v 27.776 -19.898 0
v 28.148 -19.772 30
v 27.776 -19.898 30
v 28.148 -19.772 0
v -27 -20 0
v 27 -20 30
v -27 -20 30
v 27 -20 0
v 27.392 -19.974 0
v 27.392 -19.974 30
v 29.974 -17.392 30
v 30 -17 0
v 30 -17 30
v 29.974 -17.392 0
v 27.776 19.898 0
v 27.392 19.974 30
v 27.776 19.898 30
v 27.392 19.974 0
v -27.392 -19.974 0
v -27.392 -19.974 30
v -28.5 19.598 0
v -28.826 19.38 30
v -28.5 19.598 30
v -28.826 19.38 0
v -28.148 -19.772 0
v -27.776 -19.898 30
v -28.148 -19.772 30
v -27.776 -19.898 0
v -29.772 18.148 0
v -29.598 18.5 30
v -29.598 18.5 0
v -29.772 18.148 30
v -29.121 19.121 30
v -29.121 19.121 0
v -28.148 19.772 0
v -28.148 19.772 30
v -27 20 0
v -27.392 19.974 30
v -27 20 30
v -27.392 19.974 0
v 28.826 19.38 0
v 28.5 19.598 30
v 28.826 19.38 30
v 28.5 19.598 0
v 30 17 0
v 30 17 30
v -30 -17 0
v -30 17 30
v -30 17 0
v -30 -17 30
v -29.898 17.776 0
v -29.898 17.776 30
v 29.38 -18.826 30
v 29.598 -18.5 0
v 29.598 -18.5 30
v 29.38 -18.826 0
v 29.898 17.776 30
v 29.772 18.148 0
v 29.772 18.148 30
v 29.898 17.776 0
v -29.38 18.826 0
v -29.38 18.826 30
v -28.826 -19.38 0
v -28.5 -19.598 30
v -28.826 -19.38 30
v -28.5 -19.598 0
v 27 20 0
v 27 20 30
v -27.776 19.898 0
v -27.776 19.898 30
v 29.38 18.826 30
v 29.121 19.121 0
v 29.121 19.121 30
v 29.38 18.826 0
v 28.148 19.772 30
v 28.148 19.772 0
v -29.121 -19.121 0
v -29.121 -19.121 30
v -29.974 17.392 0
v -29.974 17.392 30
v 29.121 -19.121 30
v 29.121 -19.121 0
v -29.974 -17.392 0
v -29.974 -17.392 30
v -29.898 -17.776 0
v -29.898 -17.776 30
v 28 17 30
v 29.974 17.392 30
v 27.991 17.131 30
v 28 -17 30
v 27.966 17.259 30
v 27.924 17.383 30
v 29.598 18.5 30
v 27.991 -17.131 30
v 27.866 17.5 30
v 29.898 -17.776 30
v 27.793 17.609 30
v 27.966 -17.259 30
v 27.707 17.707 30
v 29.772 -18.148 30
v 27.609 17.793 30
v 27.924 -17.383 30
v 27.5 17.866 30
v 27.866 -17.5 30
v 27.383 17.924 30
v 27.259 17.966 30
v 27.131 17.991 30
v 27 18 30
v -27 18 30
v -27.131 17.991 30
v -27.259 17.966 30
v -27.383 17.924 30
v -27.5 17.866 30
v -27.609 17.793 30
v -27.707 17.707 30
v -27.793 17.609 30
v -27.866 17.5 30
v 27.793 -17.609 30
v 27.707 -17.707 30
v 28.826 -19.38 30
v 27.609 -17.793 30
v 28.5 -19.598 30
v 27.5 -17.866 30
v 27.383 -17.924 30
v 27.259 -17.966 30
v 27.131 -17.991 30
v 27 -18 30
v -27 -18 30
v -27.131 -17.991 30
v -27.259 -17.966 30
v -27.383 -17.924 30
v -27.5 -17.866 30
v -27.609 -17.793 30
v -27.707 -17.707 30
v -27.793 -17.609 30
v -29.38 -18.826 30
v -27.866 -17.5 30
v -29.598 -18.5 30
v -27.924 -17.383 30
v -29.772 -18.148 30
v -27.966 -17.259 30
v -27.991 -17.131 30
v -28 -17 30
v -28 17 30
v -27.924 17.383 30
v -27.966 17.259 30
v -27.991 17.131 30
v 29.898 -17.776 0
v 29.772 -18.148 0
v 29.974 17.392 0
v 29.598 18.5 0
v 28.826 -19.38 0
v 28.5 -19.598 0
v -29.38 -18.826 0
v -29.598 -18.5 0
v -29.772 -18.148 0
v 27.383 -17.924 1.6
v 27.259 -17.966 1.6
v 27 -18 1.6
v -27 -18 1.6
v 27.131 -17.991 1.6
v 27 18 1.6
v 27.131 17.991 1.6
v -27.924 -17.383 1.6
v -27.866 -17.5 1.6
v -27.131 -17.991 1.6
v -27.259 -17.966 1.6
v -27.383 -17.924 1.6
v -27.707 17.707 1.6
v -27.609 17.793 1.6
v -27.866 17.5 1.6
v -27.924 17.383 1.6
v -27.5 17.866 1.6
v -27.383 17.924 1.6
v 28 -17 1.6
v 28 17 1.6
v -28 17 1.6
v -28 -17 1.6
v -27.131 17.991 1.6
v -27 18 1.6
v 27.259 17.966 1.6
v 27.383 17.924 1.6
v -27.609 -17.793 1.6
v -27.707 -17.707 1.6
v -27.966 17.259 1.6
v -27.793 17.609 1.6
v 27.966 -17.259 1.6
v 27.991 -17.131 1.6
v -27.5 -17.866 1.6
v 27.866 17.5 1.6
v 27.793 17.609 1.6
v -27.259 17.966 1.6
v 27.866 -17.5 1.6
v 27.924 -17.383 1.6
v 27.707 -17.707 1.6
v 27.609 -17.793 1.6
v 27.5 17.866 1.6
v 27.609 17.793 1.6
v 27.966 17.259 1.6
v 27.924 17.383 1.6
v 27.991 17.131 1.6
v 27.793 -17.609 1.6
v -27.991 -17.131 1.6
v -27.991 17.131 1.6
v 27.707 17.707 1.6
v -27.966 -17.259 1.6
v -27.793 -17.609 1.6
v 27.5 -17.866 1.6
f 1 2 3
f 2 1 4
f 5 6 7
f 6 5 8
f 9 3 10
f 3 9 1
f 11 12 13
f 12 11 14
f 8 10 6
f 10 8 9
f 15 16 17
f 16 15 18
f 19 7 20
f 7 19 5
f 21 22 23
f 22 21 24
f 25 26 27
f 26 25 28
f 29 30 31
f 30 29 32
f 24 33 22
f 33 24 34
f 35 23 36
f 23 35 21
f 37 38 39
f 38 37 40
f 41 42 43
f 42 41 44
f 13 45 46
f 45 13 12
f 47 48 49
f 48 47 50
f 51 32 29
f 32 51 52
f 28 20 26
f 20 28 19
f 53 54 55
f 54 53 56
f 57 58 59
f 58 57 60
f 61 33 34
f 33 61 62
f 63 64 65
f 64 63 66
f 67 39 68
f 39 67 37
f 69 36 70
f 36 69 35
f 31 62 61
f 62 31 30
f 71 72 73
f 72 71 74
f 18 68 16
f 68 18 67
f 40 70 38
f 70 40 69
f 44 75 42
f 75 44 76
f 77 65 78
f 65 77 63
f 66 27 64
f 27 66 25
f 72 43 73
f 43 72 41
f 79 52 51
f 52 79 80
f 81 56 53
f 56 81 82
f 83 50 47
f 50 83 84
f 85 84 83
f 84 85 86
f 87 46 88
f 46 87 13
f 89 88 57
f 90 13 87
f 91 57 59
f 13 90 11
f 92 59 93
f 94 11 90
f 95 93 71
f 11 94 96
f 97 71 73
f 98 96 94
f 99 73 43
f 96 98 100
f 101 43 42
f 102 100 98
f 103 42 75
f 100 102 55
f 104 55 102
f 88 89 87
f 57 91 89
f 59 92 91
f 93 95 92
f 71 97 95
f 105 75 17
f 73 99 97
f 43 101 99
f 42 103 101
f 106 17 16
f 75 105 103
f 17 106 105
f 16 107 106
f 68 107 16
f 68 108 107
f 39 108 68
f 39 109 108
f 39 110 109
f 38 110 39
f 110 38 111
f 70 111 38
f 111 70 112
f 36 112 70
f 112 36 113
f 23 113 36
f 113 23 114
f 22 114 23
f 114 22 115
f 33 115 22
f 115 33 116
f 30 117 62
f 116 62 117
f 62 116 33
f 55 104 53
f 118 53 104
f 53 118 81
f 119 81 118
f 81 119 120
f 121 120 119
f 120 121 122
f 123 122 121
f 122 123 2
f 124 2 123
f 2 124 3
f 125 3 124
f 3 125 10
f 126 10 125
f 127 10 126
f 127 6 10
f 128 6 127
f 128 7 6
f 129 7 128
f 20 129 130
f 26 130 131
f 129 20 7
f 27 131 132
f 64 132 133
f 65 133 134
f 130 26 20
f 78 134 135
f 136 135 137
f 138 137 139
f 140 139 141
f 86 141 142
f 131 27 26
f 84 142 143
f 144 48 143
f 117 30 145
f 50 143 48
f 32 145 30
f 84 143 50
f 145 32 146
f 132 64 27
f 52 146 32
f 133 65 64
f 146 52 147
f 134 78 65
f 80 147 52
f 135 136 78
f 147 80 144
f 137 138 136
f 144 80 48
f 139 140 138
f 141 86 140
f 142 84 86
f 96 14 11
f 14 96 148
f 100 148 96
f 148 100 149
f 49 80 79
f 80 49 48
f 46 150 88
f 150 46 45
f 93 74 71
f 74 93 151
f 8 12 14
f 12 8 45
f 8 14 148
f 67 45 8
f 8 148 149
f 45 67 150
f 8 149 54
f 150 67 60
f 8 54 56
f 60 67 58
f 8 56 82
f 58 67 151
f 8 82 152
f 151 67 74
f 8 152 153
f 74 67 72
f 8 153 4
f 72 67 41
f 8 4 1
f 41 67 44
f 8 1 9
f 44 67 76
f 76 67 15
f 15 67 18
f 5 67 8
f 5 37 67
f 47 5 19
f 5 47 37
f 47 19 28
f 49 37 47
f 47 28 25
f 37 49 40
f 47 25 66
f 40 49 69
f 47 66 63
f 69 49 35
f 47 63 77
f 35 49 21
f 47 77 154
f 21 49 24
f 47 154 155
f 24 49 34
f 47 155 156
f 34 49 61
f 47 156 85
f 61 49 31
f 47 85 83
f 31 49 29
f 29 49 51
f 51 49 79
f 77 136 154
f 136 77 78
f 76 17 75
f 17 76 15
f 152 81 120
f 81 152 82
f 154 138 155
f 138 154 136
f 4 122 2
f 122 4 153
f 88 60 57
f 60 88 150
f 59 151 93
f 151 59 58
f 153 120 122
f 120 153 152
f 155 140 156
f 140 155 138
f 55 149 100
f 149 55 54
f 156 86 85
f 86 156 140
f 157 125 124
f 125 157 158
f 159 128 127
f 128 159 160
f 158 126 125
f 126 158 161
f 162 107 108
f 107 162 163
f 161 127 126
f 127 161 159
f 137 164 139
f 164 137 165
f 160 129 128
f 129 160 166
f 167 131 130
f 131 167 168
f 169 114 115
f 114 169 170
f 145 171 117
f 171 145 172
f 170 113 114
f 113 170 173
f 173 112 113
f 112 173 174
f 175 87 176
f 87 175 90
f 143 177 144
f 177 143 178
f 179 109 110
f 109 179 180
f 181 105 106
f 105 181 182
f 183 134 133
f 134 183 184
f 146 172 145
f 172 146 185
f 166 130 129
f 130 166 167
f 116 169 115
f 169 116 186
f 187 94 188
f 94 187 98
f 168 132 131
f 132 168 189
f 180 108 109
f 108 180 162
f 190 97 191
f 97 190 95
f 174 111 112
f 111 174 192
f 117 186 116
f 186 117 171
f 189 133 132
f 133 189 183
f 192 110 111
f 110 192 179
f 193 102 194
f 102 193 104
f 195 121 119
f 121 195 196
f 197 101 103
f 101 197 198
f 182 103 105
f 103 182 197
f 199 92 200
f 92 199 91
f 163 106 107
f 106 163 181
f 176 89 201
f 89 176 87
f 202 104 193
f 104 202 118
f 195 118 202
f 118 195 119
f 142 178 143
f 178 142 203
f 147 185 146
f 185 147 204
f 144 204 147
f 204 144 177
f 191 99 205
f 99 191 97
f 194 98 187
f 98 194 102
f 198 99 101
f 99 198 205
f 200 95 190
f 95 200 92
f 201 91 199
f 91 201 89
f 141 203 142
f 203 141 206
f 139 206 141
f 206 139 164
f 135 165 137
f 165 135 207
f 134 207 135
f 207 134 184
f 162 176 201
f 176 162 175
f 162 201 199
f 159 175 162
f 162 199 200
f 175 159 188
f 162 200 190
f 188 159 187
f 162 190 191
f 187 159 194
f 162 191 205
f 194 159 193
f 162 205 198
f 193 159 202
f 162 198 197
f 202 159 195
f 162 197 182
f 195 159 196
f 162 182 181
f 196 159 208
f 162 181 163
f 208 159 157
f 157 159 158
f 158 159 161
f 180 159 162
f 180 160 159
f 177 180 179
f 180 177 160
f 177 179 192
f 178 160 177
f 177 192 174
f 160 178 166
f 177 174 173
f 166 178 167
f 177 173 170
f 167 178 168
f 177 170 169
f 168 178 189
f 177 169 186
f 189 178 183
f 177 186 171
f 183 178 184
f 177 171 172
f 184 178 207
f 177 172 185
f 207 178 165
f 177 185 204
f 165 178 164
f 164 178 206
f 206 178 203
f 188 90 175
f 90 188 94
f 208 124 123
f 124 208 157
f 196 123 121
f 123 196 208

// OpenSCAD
// ARTIFEX template: open box / container with rounded corners
width = 60;
depth = 40;
height = 30;
wall = 2;
floor_t = 1.6;
corner_r = 3;
$fn = 48;

module rounded_block(w, d, h, r) {
    rr = max(min(r, min(w, d) / 2 - 0.01), 0.01);
    linear_extrude(h) offset(r = rr) square([w - 2 * rr, d - 2 * rr], center = true);
}

difference() {
    rounded_block(width, depth, height, corner_r);
    translate([0, 0, floor_t])
        rounded_block(width - 2 * wall, depth - 2 * wall, height, max(corner_r - wall, 0.5));
}
